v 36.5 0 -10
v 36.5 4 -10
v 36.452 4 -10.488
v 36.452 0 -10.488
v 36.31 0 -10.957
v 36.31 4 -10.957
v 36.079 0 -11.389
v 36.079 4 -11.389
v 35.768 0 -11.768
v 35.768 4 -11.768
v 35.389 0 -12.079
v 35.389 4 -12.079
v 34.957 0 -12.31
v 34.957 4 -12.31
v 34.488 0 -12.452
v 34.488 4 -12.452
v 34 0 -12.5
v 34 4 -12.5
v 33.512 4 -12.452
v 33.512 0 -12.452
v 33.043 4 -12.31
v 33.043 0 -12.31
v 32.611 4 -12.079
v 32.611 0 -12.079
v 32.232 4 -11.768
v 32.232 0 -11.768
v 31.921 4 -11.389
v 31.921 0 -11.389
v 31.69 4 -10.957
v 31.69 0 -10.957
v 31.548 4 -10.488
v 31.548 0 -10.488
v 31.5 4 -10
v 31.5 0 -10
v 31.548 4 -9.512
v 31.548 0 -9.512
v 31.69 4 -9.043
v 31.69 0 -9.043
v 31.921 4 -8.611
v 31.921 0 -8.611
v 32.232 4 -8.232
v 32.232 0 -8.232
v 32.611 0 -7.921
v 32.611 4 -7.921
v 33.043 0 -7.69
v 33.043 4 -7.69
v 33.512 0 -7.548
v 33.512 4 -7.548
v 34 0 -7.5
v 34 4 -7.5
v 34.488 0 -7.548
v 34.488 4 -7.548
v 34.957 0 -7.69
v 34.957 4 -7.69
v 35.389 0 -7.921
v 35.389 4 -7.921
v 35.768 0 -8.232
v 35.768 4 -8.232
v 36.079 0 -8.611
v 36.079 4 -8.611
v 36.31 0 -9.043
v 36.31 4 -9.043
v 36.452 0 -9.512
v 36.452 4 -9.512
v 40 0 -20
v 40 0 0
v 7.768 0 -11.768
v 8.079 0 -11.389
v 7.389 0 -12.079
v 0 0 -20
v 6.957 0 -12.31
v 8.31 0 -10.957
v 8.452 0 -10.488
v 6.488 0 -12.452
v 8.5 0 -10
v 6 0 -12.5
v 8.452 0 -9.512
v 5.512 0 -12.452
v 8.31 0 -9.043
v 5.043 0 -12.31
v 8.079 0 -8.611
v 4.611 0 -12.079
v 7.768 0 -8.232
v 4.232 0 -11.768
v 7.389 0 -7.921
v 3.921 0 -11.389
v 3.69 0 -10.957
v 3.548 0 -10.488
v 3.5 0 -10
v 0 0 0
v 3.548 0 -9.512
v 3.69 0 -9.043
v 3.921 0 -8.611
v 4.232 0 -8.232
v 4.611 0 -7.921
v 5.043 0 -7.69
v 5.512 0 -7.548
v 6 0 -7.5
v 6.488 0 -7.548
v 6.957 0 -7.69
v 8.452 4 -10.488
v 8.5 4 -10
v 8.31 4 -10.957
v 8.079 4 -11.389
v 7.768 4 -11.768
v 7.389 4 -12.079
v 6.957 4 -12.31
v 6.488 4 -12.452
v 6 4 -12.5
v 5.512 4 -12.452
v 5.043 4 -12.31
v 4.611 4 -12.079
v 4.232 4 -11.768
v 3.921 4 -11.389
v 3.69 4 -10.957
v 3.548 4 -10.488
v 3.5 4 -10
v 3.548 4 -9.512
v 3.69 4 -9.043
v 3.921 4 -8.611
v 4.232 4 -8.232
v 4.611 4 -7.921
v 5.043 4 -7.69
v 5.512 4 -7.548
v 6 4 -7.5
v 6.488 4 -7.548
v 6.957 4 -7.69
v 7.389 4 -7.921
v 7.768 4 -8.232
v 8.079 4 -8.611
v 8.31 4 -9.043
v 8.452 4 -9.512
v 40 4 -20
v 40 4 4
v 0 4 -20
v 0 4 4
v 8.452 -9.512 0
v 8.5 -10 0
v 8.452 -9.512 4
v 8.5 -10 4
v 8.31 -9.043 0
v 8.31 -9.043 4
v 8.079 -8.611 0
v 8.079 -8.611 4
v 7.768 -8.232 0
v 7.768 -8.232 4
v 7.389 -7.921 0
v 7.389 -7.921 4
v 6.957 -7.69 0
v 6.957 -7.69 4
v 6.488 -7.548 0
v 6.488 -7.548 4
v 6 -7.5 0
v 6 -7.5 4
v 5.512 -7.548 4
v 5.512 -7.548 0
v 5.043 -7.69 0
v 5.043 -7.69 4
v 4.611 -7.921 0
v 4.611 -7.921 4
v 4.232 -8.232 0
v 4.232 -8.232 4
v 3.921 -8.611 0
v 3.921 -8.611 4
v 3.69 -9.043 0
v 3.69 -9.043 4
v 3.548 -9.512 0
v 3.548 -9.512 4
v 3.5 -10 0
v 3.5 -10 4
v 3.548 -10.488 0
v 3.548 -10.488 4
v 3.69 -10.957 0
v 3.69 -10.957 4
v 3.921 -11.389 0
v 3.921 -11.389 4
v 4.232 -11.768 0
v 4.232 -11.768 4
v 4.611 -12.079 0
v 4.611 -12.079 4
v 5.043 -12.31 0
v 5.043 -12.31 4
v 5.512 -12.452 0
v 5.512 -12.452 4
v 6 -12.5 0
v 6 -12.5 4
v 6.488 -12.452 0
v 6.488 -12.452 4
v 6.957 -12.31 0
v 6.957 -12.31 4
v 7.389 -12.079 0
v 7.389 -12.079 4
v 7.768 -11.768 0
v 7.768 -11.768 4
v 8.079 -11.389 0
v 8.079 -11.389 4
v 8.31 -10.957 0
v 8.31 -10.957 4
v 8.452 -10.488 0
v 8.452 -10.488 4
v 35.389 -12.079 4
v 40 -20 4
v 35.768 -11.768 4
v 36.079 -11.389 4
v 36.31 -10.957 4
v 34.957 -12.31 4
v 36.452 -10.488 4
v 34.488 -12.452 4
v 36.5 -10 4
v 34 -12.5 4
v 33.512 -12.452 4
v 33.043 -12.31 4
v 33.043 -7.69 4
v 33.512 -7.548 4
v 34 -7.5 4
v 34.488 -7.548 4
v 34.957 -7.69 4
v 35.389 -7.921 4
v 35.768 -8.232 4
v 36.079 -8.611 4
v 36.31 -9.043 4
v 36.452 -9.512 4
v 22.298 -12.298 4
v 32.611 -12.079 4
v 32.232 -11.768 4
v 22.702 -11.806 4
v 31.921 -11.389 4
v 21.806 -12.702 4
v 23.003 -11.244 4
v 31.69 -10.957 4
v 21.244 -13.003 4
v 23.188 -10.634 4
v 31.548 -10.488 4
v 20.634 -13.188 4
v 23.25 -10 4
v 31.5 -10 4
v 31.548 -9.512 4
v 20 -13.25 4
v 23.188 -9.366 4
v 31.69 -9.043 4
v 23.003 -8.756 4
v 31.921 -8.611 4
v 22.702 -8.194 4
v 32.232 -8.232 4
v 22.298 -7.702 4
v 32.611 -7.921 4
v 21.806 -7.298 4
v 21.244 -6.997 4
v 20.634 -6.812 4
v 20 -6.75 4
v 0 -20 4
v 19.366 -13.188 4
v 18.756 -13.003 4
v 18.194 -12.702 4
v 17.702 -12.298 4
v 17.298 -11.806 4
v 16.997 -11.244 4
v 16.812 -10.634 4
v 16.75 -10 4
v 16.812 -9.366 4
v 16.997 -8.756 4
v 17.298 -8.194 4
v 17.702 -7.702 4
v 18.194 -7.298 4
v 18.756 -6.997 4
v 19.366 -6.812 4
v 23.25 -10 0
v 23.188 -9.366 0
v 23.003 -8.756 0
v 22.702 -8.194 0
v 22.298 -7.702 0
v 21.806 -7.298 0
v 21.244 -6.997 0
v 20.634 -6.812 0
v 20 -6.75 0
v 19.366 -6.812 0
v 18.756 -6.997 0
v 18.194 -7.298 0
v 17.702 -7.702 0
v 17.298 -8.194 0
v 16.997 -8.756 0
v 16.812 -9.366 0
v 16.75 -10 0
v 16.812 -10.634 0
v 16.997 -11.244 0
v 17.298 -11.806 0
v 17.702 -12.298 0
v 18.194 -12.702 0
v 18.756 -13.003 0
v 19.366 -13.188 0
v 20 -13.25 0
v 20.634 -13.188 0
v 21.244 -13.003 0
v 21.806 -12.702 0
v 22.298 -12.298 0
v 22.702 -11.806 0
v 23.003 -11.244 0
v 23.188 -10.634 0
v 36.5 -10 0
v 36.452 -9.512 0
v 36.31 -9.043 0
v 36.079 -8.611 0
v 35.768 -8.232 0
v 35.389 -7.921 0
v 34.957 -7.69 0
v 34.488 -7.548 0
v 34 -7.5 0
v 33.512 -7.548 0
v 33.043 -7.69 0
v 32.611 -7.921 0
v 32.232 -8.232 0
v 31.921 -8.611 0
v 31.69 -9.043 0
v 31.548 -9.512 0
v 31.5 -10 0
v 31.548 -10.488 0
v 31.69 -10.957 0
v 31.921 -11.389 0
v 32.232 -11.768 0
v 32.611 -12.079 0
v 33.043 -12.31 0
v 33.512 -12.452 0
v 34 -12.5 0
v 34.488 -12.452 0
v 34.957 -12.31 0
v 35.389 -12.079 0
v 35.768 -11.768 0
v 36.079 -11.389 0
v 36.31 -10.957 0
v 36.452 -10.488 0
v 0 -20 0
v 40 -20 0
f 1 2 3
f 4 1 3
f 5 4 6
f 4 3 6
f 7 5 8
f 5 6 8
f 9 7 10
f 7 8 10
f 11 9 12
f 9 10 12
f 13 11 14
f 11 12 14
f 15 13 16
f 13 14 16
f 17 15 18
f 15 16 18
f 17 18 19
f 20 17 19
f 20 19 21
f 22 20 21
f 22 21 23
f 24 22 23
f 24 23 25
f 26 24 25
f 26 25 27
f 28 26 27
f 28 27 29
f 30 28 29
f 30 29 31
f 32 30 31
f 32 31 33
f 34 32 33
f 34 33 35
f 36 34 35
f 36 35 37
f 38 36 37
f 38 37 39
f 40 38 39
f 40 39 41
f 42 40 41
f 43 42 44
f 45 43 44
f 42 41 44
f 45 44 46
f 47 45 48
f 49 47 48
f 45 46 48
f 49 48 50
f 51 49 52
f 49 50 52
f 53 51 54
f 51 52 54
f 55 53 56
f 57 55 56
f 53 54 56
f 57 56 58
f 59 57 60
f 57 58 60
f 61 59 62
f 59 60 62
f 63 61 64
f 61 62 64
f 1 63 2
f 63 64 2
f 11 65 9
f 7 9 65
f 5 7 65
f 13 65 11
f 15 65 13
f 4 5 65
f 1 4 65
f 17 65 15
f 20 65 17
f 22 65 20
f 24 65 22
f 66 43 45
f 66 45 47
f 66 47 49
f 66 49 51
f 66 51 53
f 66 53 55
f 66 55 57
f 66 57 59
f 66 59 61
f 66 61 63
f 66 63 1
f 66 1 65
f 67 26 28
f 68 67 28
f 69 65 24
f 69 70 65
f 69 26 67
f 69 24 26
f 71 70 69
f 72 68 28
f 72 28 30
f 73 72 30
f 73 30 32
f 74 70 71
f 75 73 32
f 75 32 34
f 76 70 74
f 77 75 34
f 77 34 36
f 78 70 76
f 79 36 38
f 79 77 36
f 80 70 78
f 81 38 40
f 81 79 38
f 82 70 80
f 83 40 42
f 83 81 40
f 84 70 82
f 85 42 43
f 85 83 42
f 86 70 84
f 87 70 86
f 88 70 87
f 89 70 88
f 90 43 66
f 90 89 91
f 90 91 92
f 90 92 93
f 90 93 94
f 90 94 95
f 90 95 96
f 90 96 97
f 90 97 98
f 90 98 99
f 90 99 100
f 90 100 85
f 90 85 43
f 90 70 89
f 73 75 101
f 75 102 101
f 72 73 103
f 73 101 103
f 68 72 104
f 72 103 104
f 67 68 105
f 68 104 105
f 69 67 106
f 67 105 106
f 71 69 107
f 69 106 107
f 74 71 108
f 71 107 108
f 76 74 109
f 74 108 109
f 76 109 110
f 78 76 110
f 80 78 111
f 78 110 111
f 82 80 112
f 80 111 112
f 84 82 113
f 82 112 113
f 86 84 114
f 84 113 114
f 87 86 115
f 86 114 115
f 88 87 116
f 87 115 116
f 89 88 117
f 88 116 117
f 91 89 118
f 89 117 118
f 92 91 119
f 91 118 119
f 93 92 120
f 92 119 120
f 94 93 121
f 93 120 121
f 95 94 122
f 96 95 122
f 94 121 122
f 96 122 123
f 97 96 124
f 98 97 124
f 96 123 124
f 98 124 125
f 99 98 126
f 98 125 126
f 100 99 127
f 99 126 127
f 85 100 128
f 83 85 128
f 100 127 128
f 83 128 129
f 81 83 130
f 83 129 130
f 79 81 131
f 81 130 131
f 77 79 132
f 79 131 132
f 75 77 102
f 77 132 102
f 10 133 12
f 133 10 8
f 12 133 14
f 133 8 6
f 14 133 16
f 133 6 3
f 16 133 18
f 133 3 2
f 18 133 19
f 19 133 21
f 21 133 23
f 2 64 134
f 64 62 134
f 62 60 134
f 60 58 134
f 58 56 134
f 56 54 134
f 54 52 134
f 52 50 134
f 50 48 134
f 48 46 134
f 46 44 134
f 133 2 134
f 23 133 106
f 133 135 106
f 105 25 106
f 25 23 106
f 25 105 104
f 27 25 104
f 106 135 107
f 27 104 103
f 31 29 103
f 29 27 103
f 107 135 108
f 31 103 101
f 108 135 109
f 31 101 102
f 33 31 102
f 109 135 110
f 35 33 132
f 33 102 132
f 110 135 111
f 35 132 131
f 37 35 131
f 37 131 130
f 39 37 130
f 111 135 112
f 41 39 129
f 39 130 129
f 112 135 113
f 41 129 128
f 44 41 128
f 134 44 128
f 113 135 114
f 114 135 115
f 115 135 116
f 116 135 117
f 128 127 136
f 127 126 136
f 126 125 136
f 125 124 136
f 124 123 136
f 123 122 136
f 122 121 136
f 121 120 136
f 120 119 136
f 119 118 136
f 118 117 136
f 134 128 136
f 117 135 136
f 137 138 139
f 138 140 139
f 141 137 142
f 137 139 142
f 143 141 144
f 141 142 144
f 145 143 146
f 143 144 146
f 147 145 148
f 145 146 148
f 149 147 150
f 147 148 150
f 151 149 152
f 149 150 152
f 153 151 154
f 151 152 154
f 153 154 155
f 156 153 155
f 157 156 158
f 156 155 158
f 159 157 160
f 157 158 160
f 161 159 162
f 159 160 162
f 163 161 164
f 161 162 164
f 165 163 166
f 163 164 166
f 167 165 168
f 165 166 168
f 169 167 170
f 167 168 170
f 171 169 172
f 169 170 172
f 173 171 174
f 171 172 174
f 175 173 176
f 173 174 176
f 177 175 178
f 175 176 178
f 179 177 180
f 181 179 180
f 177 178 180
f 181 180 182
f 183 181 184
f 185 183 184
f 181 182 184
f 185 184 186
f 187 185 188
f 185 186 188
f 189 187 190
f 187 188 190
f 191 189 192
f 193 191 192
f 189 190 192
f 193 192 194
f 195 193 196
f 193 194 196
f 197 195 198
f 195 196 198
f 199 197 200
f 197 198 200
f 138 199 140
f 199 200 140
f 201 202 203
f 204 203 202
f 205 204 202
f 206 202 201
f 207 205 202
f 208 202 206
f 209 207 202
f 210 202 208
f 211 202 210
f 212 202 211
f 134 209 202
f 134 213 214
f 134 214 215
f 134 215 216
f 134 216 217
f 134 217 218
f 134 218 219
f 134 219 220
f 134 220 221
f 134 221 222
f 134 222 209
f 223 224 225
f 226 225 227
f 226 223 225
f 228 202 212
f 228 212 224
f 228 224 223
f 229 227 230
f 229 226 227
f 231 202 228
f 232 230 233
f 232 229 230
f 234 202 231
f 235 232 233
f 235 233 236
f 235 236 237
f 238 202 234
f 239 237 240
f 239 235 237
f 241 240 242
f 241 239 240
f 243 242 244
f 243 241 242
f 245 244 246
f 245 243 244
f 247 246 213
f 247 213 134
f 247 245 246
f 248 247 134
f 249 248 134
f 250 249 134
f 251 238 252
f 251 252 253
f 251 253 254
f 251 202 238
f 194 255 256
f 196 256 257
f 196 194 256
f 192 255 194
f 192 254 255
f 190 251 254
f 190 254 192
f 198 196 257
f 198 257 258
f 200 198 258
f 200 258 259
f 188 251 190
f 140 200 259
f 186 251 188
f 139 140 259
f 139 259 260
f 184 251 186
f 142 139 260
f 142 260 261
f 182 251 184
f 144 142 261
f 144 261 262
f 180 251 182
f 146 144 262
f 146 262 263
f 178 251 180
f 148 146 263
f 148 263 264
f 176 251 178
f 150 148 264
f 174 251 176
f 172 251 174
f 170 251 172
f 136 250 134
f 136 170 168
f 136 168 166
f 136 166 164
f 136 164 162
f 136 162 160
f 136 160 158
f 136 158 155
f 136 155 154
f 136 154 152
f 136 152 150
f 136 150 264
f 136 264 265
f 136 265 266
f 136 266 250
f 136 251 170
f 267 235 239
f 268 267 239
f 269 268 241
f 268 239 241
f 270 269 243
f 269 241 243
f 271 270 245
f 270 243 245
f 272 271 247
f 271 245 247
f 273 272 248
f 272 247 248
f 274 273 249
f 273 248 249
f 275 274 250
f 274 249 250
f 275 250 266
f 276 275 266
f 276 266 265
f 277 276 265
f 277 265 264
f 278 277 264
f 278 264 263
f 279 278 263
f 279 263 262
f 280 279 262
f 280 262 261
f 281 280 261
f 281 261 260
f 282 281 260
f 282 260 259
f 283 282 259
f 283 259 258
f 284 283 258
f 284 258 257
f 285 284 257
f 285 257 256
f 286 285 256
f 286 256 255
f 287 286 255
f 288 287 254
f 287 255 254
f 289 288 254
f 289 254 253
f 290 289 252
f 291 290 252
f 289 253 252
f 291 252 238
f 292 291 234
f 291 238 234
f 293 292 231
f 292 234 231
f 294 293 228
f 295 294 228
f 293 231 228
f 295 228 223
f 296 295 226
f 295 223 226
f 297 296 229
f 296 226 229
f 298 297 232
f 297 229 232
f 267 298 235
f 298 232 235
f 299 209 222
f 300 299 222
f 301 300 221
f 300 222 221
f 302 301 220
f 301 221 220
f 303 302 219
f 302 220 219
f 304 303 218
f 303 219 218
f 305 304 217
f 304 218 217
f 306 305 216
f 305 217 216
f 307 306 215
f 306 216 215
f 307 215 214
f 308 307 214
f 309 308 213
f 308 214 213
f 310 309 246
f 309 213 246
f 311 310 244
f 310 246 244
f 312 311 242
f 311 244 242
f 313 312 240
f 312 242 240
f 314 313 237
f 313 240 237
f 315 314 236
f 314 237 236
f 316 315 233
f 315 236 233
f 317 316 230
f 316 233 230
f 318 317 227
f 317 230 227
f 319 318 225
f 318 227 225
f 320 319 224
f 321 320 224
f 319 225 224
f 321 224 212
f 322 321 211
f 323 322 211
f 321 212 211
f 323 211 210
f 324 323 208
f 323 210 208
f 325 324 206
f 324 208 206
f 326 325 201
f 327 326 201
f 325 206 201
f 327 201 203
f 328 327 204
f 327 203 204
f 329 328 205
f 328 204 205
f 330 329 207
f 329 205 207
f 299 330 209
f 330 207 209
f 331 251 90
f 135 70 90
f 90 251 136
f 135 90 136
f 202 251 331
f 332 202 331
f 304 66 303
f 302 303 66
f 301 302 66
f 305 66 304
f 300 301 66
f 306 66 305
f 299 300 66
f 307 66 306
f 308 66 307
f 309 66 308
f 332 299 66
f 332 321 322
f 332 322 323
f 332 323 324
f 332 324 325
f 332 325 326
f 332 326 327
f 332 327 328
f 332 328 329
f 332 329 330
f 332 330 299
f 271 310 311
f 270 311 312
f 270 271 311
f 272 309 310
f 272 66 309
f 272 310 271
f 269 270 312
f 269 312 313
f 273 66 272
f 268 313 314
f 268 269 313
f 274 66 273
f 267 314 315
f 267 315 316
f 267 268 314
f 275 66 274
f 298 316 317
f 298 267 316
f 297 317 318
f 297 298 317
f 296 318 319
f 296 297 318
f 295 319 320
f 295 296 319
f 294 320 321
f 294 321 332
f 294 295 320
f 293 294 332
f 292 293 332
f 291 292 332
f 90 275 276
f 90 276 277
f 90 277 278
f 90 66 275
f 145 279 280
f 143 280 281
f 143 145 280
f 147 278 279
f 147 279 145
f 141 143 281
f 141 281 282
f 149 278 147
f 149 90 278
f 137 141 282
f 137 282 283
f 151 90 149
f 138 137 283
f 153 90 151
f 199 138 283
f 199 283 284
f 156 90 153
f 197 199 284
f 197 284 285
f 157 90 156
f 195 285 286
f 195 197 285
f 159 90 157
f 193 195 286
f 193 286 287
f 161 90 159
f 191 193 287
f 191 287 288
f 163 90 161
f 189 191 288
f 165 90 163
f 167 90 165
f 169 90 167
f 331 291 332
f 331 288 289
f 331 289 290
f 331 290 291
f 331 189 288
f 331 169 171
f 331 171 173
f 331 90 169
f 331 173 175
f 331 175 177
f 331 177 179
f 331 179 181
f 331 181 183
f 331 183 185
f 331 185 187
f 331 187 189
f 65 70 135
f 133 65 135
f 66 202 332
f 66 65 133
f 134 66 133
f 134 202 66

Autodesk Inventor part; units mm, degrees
ref_plane "YZ Plane" through (0, 0, 0) normal (1, 0, 0) x (0, 1, 0)
ref_plane "XZ Plane" through (0, 0, 0) normal (0, 1, 0) x (-1, 0, 0)
ref_plane "XY Plane" through (0, 0, 0) normal (0, 0, 1) x (1, 0, 0)
sketch "Sketch1" plane through (0, 0, 0) normal (1, 0, 0) x (0, 1, 0)
  line L0 (0, 0) -> (-20, 0)
  line L1 (-20, 0) -> (-20, -20)
  line L2 (-20, -20) -> (0, -20)
  line L3 (0, -20) -> (0, 0)
  line L4 (0, -20) -> (4, -20)
  line L5 (4, -20) -> (4, 0)
  line L6 (4, 0) -> (0, 0)
  line L7 (0, 0) -> (0, -20)
  line L8 (4, 0) -> (0, 0)
  line L9 (0, 0) -> (0, 4)
  line L10 (0, 4) -> (4, 4)
  line L11 (4, 4) -> (4, 0)
  line L12 (0, 4) -> (-20, 4)
  line L13 (-20, 4) -> (-20, 0)
  line L14 (-20, 0) -> (0, 0)
  line L15 (0, 0) -> (0, 4)
  dimension "d0" = 20
  dimension "d1" = 20
  dimension "d2" = 4
  dimension "d3" = 4
extrude "Extrusion1" add sketch "Sketch1" along normal blind 40 contours L6 L5 L4 L3 | L9 L10 L11 L6 | L0 L13 L12 L9
sketch "Sketch2" plane through (0, -20, 4) normal (0, 0, 1) x (1, 0, 0)
  line L0 (0, 0) -> (40, 0) projected
  line L1 (20, 0) -> (20, 10)
  circle A0 centre (20, 10) radius 3.25
  point P0 (0, 20)
  dimension "d6" = 10
  dimension "d7" = 6.5
extrude "Extrusion2" cut sketch "Sketch2" against normal through all
sketch "Sketch3" plane through (0, -20, 4) normal (0, 0, 1) x (1, 0, 0)
  line L0 (0, 0) -> (40, 0) projected
  line L1 (0, 0) -> (6, 0)
  line L2 (6, 0) -> (6, 10)
  line L3 (0, 20) -> (40, 20) projected
  line L4 (20, 0) -> (20, 3.9788)
  line L5 (40, 0) -> (0, 0)
  line L6 (34, 0) -> (34, 10)
  circle A0 centre (34, 10) radius 2.5
  circle A1 centre (6, 10) radius 2.5
  dimension "d10" = 6
  dimension "d11" = 10
  dimension "d12" = 5
  dimension "d13" = 5
extrude "Extrusion3" cut sketch "Sketch3" against normal blind 10
sketch "Sketch4" plane through (0, 4, 4) normal (0, 1, 0) x (1, 0, 0)
  line L0 (0, 24) -> (40, 24) projected
  line L1 (0, 24) -> (6, 24)
  line L2 (6, 24) -> (6, 14)
  line L3 (40, 24) -> (34, 24)
  line L4 (34, 24) -> (34, 14)
  circle A0 centre (34, 14) radius 2.5
  circle A1 centre (6, 14) radius 2.5
  point P0 (0, 4)
  dimension "d16" = 6
  dimension "d17" = 10
  dimension "d18" = 6
  dimension "d19" = 10
  dimension "d20" = 5
  dimension "d21" = 5
extrude "Extrusion4" cut sketch "Sketch4" against normal blind 10
properties part number "linac_lower_ax_mount_2"
